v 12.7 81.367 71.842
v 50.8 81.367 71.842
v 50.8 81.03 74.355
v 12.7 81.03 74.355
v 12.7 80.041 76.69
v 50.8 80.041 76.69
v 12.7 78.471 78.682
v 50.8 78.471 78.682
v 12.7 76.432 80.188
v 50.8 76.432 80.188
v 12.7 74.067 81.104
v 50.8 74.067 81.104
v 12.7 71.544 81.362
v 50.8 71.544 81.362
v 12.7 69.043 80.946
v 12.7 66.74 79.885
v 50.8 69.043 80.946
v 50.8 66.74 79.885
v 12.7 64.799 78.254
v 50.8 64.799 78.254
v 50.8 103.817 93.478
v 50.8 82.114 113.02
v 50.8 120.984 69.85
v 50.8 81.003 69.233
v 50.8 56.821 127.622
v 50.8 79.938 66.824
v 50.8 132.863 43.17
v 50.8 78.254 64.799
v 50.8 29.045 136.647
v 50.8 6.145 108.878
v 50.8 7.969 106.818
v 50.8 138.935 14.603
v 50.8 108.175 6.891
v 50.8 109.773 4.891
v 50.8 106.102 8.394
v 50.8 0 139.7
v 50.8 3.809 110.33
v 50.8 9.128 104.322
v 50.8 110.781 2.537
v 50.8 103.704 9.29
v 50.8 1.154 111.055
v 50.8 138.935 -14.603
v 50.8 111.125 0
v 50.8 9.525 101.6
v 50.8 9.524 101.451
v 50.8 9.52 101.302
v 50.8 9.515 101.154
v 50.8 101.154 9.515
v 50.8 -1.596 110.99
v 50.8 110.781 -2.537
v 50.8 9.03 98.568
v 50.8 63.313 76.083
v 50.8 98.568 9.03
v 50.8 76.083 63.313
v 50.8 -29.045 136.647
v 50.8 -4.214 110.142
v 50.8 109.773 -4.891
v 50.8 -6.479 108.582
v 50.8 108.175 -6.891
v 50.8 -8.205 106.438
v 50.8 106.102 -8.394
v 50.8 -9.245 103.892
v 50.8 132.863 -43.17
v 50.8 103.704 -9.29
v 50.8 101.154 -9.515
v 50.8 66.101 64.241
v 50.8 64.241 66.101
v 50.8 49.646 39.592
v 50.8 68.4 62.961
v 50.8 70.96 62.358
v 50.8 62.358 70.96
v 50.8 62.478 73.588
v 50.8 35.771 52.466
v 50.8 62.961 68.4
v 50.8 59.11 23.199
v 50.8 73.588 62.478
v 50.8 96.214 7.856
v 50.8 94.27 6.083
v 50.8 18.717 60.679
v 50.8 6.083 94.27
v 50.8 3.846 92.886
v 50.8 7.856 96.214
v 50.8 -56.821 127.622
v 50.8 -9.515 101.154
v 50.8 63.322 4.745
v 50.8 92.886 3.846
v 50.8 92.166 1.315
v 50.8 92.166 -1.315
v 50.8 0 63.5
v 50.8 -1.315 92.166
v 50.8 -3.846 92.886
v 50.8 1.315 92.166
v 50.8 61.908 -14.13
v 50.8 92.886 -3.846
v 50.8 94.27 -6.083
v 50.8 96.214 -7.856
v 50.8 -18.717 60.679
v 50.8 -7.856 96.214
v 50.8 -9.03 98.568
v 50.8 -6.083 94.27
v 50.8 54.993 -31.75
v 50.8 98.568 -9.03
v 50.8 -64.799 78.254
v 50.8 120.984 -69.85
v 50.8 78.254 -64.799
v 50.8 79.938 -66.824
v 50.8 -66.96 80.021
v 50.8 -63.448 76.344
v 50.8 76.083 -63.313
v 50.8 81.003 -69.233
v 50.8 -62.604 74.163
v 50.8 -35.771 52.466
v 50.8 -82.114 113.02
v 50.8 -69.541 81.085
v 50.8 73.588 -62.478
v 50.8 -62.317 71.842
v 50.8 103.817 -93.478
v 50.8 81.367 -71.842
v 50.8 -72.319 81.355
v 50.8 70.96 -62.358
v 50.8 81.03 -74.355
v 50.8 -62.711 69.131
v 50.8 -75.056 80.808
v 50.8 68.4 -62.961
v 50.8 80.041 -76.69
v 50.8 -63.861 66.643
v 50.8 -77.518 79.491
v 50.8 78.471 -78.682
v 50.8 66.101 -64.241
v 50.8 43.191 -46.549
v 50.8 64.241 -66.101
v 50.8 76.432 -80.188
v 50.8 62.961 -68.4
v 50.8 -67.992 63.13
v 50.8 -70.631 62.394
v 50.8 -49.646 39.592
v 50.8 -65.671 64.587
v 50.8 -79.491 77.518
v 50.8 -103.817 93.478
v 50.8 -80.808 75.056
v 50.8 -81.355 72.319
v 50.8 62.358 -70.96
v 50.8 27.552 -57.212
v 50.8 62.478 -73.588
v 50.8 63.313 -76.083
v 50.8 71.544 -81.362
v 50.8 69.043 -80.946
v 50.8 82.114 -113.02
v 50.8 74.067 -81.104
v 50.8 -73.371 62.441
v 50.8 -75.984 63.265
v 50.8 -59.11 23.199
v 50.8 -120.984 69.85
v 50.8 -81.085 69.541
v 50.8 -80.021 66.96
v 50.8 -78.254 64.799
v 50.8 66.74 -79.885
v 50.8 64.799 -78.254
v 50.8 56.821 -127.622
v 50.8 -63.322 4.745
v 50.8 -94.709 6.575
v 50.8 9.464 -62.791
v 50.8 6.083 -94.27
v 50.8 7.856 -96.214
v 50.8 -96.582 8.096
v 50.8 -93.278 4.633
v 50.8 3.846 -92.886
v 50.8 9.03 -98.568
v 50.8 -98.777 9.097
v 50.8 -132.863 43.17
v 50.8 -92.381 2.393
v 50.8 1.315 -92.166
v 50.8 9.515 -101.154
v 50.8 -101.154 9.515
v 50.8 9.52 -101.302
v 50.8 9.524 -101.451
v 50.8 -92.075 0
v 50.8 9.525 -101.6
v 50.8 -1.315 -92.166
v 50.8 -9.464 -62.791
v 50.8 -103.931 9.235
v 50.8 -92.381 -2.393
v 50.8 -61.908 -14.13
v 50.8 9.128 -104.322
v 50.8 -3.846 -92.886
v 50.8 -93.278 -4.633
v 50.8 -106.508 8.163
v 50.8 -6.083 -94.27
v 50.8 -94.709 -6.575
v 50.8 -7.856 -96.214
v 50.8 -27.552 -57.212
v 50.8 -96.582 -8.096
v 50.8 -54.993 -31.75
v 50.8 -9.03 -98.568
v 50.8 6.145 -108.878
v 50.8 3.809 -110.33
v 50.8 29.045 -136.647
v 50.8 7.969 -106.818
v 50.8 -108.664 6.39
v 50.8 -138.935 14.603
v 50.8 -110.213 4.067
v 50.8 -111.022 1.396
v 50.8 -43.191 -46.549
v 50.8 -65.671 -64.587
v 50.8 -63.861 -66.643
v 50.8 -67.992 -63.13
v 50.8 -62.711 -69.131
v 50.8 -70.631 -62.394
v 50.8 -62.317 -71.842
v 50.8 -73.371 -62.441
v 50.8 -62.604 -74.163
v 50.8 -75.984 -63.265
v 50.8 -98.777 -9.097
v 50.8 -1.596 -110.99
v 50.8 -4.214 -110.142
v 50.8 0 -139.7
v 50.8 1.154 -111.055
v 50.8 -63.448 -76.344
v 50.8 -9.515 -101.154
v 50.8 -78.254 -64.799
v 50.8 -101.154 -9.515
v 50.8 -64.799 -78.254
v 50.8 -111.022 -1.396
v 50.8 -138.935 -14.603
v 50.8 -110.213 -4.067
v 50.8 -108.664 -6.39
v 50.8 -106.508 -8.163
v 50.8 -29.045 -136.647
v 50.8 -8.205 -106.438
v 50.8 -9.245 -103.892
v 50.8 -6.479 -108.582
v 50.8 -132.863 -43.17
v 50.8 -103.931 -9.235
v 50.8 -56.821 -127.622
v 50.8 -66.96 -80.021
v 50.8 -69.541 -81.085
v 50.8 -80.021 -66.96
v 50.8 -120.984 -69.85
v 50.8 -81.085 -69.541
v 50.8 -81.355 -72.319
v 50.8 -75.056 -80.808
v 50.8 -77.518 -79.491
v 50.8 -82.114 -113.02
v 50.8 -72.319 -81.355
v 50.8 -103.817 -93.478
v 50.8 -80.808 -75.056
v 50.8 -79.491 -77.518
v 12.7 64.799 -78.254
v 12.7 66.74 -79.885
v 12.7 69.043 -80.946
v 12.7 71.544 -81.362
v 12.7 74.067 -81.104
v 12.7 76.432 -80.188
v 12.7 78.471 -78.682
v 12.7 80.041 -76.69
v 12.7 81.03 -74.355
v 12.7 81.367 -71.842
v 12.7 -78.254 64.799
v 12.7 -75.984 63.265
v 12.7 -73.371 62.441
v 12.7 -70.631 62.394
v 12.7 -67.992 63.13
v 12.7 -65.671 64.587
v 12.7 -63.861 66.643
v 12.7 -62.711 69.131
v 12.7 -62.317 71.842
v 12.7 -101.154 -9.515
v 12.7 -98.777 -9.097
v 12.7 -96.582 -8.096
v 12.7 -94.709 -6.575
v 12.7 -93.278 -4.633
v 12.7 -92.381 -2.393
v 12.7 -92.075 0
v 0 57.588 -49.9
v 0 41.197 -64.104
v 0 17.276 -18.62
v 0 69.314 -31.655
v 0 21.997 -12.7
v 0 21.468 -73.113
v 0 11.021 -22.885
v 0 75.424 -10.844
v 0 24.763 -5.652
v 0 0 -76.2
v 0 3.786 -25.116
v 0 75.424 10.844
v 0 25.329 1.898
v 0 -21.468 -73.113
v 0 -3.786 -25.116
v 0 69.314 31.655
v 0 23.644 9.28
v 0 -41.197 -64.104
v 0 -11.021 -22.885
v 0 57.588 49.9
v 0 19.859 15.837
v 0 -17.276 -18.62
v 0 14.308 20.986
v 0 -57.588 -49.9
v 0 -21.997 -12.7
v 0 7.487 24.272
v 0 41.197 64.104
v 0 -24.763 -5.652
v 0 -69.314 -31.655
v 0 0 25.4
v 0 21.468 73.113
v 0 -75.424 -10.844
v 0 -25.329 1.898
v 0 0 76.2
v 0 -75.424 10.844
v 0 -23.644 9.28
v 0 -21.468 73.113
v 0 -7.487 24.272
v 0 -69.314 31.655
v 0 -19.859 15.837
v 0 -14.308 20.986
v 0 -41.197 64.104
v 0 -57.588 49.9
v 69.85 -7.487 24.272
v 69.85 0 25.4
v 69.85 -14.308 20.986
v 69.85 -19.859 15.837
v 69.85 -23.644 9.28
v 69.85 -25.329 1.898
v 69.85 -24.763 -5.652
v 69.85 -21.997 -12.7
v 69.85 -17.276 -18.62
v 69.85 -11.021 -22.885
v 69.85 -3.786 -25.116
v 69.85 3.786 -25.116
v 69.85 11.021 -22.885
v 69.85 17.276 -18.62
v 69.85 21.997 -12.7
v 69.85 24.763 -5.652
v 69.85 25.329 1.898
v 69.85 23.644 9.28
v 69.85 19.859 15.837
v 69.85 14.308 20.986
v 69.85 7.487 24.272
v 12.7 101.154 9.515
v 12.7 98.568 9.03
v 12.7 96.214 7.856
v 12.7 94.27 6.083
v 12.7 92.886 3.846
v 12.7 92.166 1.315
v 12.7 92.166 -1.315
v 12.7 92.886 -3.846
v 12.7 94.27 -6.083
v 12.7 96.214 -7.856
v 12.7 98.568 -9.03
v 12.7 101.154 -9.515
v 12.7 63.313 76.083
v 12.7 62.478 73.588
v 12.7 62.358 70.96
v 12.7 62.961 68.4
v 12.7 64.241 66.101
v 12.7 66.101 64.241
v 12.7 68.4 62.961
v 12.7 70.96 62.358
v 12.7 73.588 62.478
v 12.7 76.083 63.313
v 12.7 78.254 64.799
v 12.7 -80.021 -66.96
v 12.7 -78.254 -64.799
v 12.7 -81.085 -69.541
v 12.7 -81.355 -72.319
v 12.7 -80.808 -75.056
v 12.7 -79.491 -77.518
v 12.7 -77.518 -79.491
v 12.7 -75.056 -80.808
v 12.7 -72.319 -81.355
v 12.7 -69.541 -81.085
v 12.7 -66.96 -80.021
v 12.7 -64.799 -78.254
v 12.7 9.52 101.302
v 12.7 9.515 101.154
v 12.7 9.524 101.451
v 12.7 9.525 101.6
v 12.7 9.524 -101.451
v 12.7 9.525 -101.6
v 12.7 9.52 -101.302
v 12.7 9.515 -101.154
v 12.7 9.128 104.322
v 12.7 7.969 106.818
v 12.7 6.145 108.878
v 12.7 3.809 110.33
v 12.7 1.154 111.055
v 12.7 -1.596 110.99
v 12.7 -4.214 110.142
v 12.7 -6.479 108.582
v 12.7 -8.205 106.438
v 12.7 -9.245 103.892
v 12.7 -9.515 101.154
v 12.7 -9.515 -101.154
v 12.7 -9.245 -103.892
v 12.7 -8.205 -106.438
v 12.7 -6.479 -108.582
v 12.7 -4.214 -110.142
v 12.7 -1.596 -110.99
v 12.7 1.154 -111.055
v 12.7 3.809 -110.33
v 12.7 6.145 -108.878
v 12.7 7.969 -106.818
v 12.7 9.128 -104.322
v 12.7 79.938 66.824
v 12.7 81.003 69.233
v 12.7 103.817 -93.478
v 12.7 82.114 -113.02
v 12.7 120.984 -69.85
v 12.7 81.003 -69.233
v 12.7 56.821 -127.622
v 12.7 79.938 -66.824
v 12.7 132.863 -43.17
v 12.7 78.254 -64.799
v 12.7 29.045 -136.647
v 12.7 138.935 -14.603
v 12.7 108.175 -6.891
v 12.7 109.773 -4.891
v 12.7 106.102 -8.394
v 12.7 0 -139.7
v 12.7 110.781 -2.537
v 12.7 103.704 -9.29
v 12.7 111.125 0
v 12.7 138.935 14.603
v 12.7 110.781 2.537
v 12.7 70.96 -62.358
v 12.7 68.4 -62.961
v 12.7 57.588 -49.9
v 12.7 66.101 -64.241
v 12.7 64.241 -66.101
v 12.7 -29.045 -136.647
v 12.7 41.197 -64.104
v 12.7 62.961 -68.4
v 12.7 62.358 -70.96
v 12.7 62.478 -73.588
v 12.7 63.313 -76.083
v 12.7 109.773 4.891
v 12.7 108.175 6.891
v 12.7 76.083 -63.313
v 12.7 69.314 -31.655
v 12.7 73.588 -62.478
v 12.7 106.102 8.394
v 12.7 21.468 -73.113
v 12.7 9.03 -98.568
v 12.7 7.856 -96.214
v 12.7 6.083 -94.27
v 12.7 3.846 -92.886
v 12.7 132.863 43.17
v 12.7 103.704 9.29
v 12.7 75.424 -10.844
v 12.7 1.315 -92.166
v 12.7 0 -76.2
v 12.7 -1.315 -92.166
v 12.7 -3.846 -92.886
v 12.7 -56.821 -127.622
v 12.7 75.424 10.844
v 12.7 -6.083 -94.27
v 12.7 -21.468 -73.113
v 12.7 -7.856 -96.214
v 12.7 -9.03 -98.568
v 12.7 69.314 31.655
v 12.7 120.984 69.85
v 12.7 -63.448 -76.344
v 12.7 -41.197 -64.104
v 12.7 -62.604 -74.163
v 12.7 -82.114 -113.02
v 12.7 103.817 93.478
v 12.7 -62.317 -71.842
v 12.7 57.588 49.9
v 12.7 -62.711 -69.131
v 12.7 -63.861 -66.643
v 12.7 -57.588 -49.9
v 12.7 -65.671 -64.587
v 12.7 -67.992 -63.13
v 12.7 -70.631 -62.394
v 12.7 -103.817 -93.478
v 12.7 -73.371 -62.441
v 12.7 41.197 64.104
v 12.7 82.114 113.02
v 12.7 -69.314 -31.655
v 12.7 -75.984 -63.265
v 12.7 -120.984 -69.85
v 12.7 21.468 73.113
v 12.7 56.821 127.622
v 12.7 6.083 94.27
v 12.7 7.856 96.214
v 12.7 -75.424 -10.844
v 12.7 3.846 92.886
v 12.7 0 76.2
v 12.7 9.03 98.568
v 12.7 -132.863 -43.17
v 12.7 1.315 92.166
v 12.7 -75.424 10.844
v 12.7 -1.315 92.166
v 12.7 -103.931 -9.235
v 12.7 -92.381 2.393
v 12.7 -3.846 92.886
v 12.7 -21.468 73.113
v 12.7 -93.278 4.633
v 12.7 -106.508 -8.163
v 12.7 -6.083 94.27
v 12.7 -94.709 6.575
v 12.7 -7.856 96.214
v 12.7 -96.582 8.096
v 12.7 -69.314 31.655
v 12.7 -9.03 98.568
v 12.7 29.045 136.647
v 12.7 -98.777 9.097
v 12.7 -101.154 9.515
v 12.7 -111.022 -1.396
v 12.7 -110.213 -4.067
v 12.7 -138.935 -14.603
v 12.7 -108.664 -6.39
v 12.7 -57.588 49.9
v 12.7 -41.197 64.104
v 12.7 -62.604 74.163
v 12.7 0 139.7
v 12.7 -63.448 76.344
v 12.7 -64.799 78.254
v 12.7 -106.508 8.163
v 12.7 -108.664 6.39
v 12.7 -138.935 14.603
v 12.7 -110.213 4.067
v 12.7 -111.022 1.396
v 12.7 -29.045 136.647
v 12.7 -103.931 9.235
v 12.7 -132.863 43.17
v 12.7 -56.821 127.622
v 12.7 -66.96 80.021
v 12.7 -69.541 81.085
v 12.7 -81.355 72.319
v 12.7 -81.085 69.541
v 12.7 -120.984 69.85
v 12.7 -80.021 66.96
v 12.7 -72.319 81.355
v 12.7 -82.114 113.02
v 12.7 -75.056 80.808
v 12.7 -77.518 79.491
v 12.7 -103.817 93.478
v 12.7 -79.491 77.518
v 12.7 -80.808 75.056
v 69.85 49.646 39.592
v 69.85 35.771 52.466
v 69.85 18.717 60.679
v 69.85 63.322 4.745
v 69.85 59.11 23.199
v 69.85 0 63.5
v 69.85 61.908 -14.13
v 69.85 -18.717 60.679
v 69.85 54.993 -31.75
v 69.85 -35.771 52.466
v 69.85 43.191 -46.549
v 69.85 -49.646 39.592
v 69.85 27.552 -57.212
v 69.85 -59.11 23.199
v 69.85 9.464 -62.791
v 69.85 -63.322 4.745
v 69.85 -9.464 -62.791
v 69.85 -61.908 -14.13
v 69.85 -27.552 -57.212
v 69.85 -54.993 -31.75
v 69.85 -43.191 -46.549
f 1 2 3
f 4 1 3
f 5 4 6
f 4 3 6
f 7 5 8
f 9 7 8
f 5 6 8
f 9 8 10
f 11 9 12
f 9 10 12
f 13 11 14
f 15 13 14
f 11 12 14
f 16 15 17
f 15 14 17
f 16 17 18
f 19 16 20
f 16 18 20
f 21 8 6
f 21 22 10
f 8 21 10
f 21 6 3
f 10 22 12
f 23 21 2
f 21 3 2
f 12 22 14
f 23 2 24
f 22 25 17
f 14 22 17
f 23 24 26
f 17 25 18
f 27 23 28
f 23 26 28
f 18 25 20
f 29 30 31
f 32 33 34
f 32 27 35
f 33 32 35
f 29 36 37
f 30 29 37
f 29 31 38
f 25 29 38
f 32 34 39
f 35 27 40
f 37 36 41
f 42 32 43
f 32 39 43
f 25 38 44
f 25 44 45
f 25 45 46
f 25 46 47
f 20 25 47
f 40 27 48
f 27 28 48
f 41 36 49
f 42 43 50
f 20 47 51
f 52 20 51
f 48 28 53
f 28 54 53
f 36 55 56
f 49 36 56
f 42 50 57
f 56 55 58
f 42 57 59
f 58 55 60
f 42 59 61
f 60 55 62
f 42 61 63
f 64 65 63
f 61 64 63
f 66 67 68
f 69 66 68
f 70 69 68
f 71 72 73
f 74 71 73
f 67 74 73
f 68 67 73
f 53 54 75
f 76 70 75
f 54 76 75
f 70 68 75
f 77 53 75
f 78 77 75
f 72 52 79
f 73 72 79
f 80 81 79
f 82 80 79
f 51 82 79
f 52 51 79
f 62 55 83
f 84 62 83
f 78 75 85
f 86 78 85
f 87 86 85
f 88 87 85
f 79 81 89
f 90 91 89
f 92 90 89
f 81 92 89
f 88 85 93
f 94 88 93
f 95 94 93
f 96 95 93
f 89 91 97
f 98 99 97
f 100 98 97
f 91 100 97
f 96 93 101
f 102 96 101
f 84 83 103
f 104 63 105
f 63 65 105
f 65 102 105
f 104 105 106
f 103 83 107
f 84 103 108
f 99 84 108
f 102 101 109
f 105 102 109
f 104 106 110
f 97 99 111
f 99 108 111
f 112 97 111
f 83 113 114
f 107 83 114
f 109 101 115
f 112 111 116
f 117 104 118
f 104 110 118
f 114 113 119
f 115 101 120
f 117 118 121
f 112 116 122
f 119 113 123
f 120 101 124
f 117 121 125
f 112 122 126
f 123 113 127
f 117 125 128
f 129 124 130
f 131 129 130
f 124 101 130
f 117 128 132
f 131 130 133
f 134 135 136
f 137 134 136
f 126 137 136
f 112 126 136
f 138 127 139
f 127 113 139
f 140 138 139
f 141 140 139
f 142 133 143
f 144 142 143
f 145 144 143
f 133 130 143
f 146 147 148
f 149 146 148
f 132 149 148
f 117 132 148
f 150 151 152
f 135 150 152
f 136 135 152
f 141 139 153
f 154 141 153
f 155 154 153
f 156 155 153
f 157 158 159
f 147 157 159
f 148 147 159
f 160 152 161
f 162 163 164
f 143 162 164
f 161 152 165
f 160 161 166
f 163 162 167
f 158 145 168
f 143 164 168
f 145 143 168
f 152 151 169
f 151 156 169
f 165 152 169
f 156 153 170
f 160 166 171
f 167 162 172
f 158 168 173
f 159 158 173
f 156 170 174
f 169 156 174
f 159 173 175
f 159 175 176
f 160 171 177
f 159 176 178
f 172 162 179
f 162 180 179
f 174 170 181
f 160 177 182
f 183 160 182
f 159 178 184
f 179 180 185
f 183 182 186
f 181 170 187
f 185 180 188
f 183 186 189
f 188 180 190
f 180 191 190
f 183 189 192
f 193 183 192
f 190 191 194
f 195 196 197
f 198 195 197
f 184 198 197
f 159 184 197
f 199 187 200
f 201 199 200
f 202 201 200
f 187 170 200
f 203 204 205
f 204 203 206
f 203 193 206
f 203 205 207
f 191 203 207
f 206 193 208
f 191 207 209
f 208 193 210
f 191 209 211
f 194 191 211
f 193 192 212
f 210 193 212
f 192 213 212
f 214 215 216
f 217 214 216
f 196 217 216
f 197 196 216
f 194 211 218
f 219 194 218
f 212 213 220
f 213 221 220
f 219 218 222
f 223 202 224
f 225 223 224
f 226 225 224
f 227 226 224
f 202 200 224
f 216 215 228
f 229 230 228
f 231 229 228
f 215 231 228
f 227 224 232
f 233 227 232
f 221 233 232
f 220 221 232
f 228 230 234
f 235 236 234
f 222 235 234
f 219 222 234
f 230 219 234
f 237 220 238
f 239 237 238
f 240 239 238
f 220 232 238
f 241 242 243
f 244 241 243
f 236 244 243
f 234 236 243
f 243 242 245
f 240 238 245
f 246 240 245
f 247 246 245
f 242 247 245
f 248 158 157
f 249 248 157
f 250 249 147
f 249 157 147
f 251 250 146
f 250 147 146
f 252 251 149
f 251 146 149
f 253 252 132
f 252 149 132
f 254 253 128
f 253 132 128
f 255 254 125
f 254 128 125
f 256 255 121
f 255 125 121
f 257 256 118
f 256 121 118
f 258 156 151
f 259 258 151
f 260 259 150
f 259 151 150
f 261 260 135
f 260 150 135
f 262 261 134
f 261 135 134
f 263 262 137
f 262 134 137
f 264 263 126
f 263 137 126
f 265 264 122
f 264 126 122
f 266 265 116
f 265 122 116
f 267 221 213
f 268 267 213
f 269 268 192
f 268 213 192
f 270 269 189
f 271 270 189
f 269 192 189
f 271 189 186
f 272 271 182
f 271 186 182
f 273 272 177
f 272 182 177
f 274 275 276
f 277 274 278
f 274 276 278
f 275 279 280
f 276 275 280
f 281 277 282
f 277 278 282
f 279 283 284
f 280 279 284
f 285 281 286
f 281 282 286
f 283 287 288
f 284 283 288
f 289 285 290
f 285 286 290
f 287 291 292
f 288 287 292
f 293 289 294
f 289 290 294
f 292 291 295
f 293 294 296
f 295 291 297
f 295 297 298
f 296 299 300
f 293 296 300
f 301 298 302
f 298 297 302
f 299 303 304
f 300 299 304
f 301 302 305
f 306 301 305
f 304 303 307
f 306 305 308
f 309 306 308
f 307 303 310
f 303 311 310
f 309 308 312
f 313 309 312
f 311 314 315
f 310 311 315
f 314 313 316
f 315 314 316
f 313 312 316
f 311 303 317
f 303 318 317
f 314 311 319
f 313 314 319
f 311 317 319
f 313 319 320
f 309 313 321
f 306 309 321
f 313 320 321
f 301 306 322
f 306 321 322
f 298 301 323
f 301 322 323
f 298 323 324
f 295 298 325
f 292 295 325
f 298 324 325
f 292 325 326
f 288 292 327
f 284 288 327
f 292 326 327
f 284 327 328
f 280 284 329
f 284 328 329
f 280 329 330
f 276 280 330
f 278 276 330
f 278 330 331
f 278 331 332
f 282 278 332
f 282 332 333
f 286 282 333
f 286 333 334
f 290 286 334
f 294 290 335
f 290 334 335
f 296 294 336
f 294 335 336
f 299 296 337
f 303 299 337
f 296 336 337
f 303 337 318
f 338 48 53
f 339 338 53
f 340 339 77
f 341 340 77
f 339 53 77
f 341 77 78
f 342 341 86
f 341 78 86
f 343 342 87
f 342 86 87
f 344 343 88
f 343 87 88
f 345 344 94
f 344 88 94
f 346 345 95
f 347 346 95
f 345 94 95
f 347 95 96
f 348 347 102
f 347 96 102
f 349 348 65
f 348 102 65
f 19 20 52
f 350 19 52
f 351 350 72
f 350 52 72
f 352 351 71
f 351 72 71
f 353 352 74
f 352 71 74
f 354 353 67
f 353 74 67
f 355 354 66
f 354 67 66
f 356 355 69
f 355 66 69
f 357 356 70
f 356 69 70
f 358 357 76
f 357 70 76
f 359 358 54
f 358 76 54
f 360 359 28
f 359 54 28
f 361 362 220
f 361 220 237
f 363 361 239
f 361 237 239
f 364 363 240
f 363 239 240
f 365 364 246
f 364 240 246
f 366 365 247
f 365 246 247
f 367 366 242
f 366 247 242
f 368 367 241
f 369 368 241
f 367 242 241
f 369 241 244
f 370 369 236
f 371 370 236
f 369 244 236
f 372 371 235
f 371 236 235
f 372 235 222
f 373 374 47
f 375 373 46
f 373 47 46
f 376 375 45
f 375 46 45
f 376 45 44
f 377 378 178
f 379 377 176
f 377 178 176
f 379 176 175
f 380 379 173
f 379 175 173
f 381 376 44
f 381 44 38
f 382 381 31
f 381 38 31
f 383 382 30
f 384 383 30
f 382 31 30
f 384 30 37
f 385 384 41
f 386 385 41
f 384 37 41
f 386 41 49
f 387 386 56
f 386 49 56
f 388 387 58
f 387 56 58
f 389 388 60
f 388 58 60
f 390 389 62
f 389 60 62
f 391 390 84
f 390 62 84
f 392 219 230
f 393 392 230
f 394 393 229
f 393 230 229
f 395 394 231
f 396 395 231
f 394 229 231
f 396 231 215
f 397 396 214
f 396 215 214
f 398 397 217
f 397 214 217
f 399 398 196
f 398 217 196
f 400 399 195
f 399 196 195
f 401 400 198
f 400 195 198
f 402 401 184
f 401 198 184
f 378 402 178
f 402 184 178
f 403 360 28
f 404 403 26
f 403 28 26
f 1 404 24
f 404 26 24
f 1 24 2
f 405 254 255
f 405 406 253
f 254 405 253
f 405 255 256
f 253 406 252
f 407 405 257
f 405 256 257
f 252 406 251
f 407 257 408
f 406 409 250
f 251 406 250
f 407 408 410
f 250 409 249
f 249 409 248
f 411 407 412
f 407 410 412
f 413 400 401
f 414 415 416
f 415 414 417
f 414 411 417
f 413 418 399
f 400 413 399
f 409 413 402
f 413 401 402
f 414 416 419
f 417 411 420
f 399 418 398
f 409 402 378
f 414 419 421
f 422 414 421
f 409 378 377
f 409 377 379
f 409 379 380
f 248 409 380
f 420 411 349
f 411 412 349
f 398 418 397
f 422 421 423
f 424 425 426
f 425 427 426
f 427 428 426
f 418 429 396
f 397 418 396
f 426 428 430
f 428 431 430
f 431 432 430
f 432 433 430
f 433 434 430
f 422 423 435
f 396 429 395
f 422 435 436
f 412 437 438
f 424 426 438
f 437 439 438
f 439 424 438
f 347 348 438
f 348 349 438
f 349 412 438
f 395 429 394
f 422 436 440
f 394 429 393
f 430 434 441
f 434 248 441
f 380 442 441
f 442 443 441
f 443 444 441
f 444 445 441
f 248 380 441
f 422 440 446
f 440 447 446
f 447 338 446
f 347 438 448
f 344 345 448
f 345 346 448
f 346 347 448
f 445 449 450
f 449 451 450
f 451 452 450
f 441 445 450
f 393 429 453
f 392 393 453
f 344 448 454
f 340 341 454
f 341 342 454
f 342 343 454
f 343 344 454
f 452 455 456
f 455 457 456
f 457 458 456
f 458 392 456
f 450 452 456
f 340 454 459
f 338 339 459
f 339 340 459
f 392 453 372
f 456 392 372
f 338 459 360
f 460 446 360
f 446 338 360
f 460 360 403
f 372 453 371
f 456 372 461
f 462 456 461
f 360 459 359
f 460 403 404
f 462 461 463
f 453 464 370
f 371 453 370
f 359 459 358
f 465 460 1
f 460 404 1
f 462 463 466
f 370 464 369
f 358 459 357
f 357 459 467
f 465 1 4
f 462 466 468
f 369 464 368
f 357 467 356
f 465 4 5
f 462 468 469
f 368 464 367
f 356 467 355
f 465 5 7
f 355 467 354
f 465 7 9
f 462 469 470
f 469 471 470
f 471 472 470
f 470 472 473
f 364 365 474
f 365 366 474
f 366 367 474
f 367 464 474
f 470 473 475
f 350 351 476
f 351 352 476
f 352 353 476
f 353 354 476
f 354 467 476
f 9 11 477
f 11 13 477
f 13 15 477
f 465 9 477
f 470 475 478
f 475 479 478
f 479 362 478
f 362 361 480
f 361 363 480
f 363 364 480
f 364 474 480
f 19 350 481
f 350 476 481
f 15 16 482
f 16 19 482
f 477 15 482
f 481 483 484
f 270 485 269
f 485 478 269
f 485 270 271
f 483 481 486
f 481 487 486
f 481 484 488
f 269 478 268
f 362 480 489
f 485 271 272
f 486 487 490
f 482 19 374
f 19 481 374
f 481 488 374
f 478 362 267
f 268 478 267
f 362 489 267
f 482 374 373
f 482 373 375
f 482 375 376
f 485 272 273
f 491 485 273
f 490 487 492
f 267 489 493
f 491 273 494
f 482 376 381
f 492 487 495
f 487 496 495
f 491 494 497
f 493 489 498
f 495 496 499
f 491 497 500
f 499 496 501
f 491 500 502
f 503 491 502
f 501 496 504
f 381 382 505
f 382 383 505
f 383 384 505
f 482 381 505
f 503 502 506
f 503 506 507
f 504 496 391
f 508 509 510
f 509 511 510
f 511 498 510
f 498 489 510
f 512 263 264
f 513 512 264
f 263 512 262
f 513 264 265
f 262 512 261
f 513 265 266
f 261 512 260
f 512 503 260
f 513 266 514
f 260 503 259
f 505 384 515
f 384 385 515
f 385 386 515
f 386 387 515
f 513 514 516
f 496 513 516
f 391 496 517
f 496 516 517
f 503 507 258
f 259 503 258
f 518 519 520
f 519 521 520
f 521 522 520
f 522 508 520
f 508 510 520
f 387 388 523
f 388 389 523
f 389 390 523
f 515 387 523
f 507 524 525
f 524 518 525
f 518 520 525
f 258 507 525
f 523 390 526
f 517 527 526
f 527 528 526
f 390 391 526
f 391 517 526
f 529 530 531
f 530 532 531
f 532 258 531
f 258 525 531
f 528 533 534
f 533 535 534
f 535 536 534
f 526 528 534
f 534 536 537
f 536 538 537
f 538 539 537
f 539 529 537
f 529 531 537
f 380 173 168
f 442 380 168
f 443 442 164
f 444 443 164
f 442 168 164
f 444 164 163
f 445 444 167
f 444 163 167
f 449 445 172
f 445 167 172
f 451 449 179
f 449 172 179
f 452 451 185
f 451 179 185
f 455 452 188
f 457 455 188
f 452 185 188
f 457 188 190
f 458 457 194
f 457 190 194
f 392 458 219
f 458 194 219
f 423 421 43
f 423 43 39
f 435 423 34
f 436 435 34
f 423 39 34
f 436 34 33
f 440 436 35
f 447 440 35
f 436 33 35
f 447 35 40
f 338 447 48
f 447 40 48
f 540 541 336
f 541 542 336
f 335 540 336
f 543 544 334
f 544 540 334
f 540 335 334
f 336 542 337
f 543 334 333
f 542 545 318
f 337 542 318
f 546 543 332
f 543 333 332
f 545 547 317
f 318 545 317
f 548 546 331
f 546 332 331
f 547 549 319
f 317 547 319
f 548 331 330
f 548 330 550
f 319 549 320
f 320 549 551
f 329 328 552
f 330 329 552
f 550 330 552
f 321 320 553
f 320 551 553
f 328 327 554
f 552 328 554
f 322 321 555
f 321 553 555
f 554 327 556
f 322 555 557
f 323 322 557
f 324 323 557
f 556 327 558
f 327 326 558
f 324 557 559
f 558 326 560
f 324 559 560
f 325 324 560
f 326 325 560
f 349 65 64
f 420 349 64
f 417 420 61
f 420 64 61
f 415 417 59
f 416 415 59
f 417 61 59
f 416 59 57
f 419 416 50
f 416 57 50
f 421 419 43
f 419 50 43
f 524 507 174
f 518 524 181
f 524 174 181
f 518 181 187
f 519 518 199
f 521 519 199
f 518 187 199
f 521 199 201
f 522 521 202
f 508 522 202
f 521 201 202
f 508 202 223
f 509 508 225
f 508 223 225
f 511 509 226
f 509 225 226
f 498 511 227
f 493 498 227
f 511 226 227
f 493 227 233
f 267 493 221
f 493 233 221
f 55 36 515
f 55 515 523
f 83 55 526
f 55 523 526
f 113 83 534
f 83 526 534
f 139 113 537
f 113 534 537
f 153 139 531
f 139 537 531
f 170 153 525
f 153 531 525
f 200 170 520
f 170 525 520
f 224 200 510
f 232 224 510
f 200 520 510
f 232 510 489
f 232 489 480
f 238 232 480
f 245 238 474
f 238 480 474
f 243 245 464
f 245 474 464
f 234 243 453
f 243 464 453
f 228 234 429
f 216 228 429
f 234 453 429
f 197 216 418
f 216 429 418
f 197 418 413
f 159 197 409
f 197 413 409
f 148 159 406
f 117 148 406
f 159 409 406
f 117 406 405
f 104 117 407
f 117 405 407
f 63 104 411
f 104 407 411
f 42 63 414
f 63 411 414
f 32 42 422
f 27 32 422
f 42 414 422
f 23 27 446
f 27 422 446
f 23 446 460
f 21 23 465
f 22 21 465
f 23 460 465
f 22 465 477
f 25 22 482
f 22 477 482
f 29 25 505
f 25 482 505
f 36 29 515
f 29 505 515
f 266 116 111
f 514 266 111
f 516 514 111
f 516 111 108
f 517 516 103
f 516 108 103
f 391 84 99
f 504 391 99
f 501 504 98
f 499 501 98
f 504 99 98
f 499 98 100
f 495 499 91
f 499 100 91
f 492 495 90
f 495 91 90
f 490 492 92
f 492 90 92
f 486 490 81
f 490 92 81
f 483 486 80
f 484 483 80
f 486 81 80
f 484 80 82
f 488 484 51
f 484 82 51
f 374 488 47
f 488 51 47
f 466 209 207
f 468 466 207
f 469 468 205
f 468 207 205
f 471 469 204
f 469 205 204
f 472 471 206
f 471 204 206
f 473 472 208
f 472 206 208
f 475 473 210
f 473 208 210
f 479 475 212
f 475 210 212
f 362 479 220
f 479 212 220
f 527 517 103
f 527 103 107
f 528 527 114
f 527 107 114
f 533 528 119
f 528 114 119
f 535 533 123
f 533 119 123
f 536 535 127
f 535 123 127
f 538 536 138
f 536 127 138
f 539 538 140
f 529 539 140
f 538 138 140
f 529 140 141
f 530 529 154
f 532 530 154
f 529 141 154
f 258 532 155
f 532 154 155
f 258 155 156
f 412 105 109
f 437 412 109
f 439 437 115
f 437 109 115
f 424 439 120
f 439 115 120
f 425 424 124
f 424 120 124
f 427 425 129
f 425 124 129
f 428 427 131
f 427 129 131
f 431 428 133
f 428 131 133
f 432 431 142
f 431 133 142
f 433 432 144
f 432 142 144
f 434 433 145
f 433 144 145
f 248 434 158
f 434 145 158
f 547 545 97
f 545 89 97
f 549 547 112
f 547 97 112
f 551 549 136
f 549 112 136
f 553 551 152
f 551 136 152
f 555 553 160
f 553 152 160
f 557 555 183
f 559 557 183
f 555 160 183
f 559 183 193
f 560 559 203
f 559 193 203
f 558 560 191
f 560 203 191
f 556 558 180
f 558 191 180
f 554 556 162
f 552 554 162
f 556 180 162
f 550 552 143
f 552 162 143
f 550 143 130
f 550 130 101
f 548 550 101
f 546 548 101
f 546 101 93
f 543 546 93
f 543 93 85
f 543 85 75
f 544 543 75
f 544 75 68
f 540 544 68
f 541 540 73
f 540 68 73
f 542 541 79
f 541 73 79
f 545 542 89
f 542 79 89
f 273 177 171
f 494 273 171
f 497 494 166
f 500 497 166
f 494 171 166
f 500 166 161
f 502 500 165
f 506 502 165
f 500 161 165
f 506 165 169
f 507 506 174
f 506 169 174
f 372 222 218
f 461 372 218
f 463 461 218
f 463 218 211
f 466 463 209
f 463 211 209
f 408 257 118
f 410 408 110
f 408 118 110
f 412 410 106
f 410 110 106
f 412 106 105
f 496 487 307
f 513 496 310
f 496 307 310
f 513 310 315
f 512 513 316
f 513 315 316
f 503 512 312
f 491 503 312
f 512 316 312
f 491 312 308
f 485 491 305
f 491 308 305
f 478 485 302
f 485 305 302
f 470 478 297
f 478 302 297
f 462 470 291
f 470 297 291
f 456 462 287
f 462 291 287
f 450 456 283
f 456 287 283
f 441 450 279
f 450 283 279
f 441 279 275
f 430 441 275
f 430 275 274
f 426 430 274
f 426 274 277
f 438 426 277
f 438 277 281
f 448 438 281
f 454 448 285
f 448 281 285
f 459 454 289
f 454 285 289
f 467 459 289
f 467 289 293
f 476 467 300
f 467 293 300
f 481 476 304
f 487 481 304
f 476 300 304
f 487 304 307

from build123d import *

# Parameters (mm, degrees)
F3_DEPTH = 50.801


with BuildPart() as f1:
    # F0 (on Front) → F1 (revolve)
    with BuildSketch(Plane.XZ):
        Polygon((0, 76.2), (0, 25.4), (69.85, 25.4), (69.85, 63.5), (50.8, 63.5), (50.8, 139.7), (12.7, 139.7), (12.7, 76.2), align=None)
    revolve(axis=Axis((-2.3766048754, 0, 0), (1, 0, 0)))

    # F2 (on face) → F3 (cut, through all)
    with BuildSketch(Plane.YZ.offset(50.8)):
        with BuildLine():
            ThreePointArc((9.5145297678, 101.153515625), (0, 101.6), (-9.5145297678, 101.153515625))
            ThreePointArc((-9.5145297678, 101.153515625), (0, 92.075), (9.5145297678, 101.153515625))
        make_face()
        with BuildLine():
            ThreePointArc((9.5145297678, 101.153515625), (9.5223820822, 101.3766964382), (9.525, 101.6))
            ThreePointArc((9.525, 101.6), (-0.2233035618, 111.1223820822), (-9.5145297678, 101.153515625))
            ThreePointArc((-9.5145297678, 101.153515625), (0, 101.6), (9.5145297678, 101.153515625))
        make_face()
        with BuildLine():
            ThreePointArc((-62.3170489686, 71.8420489686), (-62.9590604886, 75.2798012378), (-64.7985483207, 78.2541253579))
            ThreePointArc((-64.7985483207, 78.2541253579), (-71.8420489686, 71.8420489686), (-78.2541253579, 64.7985483207))
            ThreePointArc((-78.2541253579, 64.7985483207), (-67.9916855187, 63.1299696356), (-62.3170489686, 71.8420489686))
        make_face()
        with BuildLine():
            ThreePointArc((-78.2541253579, 64.7985483207), (-71.8420489686, 71.8420489686), (-64.7985483207, 78.2541253579))
            ThreePointArc((-64.7985483207, 78.2541253579), (-78.5772410594, 78.5772410594), (-78.2541253579, 64.7985483207))
        make_face()
        with BuildLine():
            ThreePointArc((-92.075, 0), (-94.7087595938, 6.5754414805), (-101.153515625, 9.5145297678))
            ThreePointArc((-101.153515625, 9.5145297678), (-101.6, 0), (-101.153515625, -9.5145297678))
            ThreePointArc((-101.153515625, -9.5145297678), (-94.7087595938, -6.5754414805), (-92.075, 0))
        make_face()
        with BuildLine():
            ThreePointArc((-101.153515625, -9.5145297678), (-101.6, 0), (-101.153515625, 9.5145297678))
            ThreePointArc((-101.153515625, 9.5145297678), (-111.125, 0), (-101.153515625, -9.5145297678))
        make_face()
        with BuildLine():
            ThreePointArc((-64.7985483207, -78.2541253579), (-71.8420489686, -71.8420489686), (-78.2541253579, -64.7985483207))
            ThreePointArc((-78.2541253579, -64.7985483207), (-78.5772410594, -78.5772410594), (-64.7985483207, -78.2541253579))
        make_face()
        with BuildLine():
            ThreePointArc((-62.3170489686, -71.8420489686), (-67.9916855187, -63.1299696356), (-78.2541253579, -64.7985483207))
            ThreePointArc((-78.2541253579, -64.7985483207), (-71.8420489686, -71.8420489686), (-64.7985483207, -78.2541253579))
            ThreePointArc((-64.7985483207, -78.2541253579), (-62.9590604886, -75.2798012378), (-62.3170489686, -71.8420489686))
        make_face()
        with BuildLine():
            ThreePointArc((9.5145297678, -101.153515625), (0, -92.075), (-9.5145297678, -101.153515625))
            ThreePointArc((-9.5145297678, -101.153515625), (0, -101.6), (9.5145297678, -101.153515625))
        make_face()
        with BuildLine():
            ThreePointArc((9.5145297678, -101.153515625), (0, -101.6), (-9.5145297678, -101.153515625))
            ThreePointArc((-9.5145297678, -101.153515625), (-0.2233035618, -111.1223820822), (9.525, -101.6))
            ThreePointArc((9.525, -101.6), (9.5223820822, -101.3766964382), (9.5145297678, -101.153515625))
        make_face()
        with BuildLine():
            ThreePointArc((81.3670489686, -71.8420489686), (80.5541283015, -67.9916855187), (78.2541253579, -64.7985483207))
            ThreePointArc((78.2541253579, -64.7985483207), (71.8420489686, -71.8420489686), (64.7985483207, -78.2541253579))
            ThreePointArc((64.7985483207, -78.2541253579), (75.2798012378, -80.7250374485), (81.3670489686, -71.8420489686))
        make_face()
        with BuildLine():
            ThreePointArc((64.7985483207, -78.2541253579), (71.8420489686, -71.8420489686), (78.2541253579, -64.7985483207))
            ThreePointArc((78.2541253579, -64.7985483207), (65.1068568778, -65.1068568778), (64.7985483207, -78.2541253579))
        make_face()
        with BuildLine():
            ThreePointArc((101.6, 0), (101.4883175235, 4.7625), (101.153515625, 9.5145297678))
            ThreePointArc((101.153515625, 9.5145297678), (92.075, 0), (101.153515625, -9.5145297678))
            ThreePointArc((101.153515625, -9.5145297678), (101.4883175235, -4.7625), (101.6, 0))
        make_face()
        with BuildLine():
            ThreePointArc((111.125, 0), (108.1754414805, 6.8912404062), (101.153515625, 9.5145297678))
            ThreePointArc((101.153515625, 9.5145297678), (101.4883175235, 4.7625), (101.6, 0))
            ThreePointArc((101.6, 0), (101.4883175235, -4.7625), (101.153515625, -9.5145297678))
            ThreePointArc((101.153515625, -9.5145297678), (108.1754414805, -6.8912404062), (111.125, 0))
        make_face()
        with BuildLine():
            ThreePointArc((81.3670489686, 71.8420489686), (75.2798012378, 80.7250374485), (64.7985483207, 78.2541253579))
            ThreePointArc((64.7985483207, 78.2541253579), (71.8420489686, 71.8420489686), (78.2541253579, 64.7985483207))
            ThreePointArc((78.2541253579, 64.7985483207), (80.5541283015, 67.9916855187), (81.3670489686, 71.8420489686))
        make_face()
        with BuildLine():
            ThreePointArc((78.2541253579, 64.7985483207), (71.8420489686, 71.8420489686), (64.7985483207, 78.2541253579))
            ThreePointArc((64.7985483207, 78.2541253579), (65.1068568778, 65.1068568778), (78.2541253579, 64.7985483207))
        make_face()
    extrude(amount=-F3_DEPTH, mode=Mode.SUBTRACT)


solid = f1.part
